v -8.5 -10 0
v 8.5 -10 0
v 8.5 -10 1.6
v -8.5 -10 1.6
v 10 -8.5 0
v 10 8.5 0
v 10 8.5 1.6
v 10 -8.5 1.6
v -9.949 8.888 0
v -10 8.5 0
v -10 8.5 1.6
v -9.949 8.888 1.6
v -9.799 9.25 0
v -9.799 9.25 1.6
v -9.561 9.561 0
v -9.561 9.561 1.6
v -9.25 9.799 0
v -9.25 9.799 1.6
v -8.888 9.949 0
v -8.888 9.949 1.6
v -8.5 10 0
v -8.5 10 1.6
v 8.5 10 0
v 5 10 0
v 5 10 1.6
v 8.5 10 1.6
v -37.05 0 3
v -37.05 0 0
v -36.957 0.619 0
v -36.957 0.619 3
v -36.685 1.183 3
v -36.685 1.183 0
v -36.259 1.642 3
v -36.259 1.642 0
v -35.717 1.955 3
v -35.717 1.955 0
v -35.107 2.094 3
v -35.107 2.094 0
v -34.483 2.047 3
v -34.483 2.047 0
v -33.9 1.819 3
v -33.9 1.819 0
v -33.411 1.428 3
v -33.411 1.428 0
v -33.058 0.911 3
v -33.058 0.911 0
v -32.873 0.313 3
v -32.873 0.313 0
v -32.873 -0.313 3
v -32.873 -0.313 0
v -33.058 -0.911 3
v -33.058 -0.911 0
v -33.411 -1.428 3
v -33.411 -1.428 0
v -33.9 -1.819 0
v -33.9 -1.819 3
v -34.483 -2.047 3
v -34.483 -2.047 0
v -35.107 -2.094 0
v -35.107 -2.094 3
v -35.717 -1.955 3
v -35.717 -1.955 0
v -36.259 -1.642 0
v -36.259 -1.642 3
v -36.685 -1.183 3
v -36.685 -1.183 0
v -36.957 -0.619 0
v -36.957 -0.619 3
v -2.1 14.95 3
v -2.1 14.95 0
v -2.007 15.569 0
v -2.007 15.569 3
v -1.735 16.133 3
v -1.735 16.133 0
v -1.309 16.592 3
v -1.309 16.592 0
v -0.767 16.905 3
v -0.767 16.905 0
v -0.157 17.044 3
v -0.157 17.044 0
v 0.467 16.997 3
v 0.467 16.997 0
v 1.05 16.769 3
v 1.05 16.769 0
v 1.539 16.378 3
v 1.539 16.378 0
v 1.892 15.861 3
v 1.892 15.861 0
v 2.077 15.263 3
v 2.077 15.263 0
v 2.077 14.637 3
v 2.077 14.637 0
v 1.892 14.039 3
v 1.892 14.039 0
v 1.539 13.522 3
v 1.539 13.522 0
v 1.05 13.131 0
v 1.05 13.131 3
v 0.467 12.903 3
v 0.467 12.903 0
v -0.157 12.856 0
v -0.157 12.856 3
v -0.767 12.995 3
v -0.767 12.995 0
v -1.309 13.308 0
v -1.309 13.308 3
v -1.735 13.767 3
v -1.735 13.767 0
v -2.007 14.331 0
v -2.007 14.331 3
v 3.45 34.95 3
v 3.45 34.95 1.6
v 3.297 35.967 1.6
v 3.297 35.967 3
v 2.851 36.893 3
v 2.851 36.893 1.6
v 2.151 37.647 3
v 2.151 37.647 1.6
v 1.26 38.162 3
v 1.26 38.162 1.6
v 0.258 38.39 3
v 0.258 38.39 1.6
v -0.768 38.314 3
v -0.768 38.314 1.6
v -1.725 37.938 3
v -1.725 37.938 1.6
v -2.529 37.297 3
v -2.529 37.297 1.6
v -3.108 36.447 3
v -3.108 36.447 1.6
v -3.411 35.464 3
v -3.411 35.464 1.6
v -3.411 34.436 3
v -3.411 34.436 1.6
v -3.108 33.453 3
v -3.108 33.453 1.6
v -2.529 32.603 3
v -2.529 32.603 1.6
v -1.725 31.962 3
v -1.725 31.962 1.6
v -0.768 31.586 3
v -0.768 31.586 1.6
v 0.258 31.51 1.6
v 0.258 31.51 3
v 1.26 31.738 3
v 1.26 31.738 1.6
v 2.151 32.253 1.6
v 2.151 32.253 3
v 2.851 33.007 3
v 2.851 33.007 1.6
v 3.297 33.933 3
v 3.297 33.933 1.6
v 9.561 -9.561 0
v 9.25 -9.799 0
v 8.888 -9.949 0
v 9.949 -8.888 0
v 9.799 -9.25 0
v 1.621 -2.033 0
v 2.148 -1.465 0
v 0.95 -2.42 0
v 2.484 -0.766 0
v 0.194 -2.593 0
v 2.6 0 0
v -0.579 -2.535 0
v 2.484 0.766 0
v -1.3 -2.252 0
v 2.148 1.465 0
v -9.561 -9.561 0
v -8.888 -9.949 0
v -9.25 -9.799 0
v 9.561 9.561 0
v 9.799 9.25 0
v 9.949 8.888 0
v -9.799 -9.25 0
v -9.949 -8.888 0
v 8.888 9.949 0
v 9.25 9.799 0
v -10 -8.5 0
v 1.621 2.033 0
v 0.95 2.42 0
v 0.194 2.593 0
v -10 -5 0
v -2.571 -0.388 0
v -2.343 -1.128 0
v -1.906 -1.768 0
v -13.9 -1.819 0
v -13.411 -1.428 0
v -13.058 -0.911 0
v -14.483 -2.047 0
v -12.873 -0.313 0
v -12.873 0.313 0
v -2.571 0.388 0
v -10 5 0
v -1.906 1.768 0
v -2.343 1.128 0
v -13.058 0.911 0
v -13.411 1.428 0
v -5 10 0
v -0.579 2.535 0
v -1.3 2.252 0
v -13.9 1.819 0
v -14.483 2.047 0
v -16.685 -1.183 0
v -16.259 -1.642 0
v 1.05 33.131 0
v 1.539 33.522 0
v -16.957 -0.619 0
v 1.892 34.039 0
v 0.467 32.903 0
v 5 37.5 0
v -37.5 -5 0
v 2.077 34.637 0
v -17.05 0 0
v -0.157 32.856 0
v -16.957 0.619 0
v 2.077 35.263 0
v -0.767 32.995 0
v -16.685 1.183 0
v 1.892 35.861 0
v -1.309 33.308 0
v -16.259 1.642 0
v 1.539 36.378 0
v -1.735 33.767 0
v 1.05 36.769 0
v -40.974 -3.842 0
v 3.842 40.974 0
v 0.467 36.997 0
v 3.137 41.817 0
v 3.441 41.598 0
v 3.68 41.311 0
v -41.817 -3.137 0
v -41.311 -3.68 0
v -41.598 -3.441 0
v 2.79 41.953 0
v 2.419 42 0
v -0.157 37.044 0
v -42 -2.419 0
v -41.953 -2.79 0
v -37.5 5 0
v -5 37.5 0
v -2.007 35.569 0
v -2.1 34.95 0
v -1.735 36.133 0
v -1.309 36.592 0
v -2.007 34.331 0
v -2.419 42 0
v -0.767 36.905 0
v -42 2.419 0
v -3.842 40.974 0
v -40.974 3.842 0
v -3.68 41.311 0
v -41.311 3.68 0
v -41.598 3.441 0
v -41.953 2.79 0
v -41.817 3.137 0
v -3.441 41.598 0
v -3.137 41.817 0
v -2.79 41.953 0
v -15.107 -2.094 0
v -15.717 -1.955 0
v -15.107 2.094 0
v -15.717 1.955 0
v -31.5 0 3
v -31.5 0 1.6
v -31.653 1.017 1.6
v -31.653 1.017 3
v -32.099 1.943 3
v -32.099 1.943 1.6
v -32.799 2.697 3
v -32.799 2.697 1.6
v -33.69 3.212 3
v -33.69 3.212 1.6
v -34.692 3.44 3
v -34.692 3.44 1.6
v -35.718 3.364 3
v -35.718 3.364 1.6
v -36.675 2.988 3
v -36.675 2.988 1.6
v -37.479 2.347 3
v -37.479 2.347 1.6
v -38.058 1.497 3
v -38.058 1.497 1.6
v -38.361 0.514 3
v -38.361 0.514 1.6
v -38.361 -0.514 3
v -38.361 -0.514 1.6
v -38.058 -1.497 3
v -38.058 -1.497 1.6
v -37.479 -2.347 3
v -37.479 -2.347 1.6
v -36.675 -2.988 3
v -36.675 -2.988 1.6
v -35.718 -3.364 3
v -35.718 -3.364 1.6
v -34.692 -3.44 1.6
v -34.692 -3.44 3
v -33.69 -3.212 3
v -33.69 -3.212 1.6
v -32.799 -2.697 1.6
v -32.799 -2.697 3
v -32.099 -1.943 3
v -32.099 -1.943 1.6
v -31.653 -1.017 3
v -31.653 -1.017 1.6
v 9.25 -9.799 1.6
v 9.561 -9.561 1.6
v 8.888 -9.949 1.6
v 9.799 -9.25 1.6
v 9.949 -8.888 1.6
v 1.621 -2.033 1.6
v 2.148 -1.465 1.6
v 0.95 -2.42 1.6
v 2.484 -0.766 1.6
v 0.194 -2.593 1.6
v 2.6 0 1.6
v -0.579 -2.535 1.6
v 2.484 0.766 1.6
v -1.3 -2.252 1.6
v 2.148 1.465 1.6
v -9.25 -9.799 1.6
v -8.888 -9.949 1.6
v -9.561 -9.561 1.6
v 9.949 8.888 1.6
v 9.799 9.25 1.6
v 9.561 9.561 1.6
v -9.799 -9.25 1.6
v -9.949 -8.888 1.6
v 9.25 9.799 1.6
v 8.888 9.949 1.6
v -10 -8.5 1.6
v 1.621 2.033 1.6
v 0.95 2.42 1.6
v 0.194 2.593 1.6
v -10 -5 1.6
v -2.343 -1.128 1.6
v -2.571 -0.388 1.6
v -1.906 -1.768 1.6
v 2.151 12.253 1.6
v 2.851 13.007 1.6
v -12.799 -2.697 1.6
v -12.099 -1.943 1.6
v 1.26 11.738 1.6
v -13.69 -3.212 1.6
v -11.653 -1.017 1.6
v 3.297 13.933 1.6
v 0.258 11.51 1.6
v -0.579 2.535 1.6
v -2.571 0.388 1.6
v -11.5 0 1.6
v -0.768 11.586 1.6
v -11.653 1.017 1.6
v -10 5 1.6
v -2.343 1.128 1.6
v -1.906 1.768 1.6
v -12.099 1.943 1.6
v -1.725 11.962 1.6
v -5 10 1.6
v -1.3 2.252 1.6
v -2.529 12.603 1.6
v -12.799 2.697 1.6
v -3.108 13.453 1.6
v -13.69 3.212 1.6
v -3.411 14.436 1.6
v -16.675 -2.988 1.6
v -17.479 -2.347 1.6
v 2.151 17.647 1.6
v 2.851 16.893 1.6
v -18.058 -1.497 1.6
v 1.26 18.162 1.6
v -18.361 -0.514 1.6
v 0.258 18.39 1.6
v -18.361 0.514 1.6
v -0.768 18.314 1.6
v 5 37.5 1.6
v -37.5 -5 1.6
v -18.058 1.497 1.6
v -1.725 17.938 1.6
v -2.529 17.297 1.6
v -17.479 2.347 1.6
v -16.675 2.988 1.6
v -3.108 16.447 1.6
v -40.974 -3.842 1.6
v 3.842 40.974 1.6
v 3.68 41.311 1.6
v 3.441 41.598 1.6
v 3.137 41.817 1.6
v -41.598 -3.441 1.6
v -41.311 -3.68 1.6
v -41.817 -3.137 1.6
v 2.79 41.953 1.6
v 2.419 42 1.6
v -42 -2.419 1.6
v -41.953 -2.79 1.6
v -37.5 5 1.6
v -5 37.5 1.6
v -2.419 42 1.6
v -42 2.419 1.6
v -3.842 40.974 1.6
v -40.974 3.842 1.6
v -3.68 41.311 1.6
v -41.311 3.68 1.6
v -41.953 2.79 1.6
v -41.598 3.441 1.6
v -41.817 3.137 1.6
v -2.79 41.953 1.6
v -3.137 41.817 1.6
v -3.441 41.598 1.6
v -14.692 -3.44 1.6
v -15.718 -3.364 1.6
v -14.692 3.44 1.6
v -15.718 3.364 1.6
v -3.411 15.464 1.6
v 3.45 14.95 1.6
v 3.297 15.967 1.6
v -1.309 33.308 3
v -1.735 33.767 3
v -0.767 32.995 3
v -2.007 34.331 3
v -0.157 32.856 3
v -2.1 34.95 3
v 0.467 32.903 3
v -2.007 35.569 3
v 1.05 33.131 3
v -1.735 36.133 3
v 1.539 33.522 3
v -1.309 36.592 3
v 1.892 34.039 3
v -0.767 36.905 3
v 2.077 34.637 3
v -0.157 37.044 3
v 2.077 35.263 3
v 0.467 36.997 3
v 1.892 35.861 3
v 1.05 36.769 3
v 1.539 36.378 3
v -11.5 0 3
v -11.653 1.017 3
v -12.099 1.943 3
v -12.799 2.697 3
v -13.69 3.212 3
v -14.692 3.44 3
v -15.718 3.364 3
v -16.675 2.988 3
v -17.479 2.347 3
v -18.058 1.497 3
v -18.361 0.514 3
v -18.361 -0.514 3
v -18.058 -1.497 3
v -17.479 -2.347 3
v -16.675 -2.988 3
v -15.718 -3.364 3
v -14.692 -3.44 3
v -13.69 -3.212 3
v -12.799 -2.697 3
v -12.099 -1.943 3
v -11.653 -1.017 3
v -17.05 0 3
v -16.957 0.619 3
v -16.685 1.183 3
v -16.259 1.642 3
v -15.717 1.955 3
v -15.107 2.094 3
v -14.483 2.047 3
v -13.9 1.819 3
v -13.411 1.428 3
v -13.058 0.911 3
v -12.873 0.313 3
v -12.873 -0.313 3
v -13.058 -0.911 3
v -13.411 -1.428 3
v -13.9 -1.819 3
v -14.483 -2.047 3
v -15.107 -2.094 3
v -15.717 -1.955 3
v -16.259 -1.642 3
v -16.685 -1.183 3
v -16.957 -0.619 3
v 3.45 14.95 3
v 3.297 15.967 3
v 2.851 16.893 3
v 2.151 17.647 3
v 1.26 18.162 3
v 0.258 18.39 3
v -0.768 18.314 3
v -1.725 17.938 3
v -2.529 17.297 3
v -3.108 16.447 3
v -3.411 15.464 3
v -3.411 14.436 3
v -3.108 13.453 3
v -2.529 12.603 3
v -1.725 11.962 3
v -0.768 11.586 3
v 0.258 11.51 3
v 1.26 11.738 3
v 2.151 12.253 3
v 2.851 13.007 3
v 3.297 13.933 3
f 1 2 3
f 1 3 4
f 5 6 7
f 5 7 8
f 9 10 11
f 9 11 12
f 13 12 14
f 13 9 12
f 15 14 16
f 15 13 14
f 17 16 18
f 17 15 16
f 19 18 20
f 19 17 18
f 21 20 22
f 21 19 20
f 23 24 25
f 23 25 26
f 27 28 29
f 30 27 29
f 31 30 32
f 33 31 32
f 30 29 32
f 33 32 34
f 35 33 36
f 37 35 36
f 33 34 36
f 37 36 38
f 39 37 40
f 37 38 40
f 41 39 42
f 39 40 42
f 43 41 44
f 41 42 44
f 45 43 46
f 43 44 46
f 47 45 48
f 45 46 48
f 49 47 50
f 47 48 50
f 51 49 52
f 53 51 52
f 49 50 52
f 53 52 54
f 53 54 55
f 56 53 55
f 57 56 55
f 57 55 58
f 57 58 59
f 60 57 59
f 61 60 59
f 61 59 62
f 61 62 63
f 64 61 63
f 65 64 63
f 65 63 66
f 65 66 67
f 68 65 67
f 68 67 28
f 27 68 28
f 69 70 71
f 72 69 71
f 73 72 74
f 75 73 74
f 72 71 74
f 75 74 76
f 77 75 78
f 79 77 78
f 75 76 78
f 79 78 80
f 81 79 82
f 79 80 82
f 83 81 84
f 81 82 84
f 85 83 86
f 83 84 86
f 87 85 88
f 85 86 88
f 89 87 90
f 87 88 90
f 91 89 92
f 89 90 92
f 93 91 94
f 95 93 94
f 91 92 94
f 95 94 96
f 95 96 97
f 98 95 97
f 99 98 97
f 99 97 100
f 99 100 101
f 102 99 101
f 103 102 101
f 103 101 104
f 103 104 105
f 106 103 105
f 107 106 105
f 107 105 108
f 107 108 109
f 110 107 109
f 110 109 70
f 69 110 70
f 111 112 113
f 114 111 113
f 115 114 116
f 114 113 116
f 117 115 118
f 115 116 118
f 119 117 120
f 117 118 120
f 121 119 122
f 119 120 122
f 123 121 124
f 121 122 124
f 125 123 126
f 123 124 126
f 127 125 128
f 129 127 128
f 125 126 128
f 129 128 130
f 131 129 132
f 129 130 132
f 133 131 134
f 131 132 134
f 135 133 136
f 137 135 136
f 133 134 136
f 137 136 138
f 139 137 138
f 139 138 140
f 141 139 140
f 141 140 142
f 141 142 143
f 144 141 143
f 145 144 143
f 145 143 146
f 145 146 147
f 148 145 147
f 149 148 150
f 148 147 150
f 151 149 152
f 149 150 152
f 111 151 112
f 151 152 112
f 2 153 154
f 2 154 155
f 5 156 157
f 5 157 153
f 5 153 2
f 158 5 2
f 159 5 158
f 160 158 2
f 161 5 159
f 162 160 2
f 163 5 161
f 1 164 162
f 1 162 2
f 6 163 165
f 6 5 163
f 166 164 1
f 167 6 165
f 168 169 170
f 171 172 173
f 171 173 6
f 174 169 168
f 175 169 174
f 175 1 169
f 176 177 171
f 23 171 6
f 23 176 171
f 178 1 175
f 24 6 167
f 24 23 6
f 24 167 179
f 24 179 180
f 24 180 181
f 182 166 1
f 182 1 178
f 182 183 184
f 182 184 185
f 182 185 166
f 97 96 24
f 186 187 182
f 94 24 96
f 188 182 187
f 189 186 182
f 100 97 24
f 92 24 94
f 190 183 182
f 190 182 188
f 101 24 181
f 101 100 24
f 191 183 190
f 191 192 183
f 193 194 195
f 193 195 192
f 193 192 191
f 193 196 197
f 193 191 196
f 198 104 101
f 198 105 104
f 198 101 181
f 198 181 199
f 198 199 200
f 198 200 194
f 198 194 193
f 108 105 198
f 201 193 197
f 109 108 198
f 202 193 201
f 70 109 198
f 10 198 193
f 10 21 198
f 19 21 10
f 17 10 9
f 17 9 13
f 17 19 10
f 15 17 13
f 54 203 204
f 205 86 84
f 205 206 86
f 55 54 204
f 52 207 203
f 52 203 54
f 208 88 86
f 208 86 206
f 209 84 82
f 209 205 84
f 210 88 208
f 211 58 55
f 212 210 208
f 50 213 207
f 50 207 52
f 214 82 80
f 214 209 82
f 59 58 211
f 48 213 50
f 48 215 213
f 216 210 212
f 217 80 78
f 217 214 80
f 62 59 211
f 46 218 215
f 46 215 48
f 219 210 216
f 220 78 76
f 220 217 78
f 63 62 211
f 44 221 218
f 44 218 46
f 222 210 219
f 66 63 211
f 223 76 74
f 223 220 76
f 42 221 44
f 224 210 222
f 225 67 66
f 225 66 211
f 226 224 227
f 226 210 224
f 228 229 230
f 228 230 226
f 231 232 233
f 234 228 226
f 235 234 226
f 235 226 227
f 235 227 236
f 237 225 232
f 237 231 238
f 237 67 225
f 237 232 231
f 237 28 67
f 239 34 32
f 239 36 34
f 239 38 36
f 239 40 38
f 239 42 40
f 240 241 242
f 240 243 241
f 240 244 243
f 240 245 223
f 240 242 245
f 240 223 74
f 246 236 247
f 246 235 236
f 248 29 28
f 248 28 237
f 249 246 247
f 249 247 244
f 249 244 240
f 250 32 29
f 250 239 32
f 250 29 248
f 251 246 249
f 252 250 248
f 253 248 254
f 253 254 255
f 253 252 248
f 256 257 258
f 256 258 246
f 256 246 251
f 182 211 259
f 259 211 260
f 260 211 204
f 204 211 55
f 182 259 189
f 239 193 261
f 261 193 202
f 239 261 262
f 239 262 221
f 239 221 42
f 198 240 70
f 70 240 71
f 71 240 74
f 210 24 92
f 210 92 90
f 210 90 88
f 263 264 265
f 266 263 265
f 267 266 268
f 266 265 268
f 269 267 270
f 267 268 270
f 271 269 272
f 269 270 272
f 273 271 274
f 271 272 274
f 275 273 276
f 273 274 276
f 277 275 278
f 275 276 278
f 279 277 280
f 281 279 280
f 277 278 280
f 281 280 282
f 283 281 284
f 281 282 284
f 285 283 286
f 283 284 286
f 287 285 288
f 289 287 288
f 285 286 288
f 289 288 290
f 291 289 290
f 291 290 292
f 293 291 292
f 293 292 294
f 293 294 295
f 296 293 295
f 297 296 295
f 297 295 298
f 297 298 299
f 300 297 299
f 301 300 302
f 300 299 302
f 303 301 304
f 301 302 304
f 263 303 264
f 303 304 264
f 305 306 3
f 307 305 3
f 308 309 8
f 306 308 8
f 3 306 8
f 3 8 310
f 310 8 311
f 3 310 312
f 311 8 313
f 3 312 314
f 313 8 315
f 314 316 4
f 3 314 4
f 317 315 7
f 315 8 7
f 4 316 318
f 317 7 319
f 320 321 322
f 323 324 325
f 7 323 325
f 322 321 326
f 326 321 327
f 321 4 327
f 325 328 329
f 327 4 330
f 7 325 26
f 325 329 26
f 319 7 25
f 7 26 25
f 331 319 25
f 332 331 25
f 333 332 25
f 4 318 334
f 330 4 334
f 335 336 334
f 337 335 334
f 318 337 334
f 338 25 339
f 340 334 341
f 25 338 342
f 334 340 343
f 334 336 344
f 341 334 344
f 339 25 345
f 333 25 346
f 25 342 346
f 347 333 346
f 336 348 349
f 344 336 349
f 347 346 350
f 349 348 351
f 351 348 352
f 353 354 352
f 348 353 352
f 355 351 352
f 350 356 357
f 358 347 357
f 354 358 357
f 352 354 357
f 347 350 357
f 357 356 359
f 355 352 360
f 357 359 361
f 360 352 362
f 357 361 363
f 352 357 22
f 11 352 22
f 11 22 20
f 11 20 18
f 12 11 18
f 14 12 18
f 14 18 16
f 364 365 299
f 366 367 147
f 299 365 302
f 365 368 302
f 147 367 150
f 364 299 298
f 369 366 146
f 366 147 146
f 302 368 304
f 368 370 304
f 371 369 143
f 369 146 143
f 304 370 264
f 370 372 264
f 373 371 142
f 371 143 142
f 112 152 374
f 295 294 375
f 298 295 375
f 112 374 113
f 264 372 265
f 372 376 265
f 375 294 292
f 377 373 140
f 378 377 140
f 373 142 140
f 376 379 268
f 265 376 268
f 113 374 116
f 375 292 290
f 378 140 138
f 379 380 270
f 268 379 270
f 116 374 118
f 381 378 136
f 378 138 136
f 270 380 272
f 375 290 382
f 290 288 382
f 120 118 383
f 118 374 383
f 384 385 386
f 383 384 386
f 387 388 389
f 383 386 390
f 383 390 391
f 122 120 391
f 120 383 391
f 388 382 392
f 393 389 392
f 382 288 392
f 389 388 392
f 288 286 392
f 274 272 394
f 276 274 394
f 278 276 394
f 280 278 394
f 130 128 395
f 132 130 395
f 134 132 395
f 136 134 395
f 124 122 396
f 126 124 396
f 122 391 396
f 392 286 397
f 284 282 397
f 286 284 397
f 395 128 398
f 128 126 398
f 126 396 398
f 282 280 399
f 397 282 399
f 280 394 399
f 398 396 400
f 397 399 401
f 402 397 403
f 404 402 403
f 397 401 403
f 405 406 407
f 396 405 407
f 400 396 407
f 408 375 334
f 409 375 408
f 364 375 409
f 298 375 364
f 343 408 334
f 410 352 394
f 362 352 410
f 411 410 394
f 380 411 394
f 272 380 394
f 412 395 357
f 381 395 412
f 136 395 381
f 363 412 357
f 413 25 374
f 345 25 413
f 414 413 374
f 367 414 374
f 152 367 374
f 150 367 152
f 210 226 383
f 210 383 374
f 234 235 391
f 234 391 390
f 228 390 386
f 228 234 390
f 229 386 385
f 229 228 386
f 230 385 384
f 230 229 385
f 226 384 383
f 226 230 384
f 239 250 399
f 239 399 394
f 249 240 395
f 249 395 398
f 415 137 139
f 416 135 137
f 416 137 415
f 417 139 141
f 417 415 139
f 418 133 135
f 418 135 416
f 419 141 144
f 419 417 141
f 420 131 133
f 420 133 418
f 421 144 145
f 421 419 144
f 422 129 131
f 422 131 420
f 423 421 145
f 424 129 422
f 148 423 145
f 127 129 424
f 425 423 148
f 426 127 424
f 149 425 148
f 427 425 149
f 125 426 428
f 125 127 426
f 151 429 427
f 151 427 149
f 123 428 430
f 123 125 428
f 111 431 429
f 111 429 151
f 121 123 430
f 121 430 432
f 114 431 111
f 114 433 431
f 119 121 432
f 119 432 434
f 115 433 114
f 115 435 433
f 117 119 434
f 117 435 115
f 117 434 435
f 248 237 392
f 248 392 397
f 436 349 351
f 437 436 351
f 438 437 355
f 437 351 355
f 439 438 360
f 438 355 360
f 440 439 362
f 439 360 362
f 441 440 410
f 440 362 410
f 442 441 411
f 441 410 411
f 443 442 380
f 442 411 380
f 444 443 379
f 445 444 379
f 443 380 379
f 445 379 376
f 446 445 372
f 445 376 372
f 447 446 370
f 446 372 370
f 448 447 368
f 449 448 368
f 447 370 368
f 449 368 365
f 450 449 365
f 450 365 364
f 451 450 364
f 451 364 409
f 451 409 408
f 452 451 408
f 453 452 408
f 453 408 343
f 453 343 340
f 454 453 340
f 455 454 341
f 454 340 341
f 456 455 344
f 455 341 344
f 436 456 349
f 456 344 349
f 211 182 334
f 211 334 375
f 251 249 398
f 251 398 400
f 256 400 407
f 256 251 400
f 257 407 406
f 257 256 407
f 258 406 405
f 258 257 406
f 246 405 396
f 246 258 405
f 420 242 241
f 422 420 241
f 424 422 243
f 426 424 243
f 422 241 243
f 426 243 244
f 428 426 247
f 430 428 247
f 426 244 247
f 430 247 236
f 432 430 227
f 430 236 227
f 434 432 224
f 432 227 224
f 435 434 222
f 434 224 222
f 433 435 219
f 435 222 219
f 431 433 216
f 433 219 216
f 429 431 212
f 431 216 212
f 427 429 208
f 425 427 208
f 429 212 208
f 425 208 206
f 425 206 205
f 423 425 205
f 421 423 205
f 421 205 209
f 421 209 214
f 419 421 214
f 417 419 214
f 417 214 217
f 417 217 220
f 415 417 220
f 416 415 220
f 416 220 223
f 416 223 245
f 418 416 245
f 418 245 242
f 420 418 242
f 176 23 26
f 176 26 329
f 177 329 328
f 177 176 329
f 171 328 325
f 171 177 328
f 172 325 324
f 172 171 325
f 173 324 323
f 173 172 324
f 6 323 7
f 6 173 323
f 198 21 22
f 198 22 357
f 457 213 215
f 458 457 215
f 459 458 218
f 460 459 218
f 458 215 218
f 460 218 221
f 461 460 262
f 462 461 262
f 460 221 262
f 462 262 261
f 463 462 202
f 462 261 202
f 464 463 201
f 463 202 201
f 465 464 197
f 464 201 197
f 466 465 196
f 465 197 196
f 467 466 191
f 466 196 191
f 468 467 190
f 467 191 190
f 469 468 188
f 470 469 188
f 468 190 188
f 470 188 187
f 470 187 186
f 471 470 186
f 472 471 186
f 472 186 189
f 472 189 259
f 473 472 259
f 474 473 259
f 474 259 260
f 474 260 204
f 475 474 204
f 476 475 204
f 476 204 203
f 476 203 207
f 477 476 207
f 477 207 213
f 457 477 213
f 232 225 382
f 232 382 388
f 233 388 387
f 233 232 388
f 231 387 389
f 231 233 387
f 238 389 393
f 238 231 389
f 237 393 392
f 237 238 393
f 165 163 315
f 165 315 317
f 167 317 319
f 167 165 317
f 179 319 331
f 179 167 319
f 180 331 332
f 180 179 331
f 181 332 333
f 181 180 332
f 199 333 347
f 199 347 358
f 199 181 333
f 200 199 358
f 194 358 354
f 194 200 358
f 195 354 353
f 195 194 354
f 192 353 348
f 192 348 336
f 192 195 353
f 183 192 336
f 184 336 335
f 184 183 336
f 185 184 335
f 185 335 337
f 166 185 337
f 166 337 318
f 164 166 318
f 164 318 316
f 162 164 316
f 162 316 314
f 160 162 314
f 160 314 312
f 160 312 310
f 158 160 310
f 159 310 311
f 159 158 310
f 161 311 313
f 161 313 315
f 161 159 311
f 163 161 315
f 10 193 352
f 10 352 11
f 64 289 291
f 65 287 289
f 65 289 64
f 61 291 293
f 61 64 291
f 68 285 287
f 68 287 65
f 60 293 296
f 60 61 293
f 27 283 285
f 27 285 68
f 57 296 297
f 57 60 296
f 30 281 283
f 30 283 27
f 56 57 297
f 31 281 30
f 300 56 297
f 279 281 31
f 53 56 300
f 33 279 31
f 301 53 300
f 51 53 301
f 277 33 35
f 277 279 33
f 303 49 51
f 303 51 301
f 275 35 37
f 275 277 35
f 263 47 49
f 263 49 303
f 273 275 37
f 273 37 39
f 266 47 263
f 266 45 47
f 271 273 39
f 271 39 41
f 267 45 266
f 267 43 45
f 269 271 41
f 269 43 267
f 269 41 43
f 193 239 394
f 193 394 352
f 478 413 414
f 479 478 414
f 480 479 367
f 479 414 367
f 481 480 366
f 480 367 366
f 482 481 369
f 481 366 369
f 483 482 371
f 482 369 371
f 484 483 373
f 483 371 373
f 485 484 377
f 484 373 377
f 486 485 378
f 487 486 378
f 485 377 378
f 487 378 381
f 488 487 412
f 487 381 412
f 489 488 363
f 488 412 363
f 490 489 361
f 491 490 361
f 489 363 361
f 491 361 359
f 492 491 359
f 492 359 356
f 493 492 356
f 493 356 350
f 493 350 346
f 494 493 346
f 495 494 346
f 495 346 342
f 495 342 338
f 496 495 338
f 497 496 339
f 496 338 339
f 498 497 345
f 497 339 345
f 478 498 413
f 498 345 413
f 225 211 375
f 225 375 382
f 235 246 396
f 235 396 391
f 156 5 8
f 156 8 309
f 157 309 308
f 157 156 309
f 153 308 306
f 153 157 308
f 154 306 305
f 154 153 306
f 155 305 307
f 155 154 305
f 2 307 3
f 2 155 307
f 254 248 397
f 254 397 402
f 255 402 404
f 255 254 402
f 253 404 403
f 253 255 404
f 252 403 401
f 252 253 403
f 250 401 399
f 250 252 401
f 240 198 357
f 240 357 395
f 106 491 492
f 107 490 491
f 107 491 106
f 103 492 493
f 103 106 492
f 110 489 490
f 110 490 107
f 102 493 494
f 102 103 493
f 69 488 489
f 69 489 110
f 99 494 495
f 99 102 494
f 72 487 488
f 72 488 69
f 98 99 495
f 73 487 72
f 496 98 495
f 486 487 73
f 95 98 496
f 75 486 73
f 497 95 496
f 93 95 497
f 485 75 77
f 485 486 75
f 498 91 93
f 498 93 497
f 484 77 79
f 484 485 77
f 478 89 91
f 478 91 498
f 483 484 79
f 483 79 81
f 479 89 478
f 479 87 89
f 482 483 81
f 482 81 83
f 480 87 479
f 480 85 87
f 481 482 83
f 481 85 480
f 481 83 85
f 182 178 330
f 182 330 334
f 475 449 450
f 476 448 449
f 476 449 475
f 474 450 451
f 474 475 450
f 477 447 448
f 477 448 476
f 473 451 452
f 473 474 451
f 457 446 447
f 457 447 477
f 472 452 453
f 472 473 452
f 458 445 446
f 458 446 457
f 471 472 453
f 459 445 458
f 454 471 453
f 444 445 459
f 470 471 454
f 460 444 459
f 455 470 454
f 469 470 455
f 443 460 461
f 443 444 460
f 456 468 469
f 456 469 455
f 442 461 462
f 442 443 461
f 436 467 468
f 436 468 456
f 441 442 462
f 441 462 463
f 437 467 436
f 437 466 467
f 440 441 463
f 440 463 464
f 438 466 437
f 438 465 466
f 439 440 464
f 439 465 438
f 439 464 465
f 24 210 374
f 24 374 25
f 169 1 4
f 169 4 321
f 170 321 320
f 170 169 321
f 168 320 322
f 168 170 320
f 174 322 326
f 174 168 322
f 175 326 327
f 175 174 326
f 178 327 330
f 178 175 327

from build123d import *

# Parameters (mm, degrees)
SKETCH1_R             = 2.6
BOSS_EXTRUDE1_DEPTH   = 1.6
SKETCH2_R             = 3.45
BOSS_EXTRUDE2_DEPTH   = 1.4
M5X0_8_TAPPED_HOLE1_D = 4.2


with BuildPart() as part:
    # Sketch1 → Boss-Extrude1 (new body)
    with BuildSketch(Plane.XY):
        with BuildLine():
            Line((-10, -8.5), (-10, -5))
            Line((-10, -5), (-37.5, -5))
            Line((-37.5, -5), (-40.974341649, -3.841886117))
            ThreePointArc((-40.974341649, -3.841886117), (-41.716863278, -3.295926597), (-42, -2.41886117))
            Line((-42, -2.41886117), (-42, 2.41886117))
            ThreePointArc((-42, 2.41886117), (-41.716863278, 3.295926597), (-40.974341649, 3.841886117))
            Line((-40.974341649, 3.841886117), (-37.5, 5))
            Line((-37.5, 5), (-10, 5))
            Line((-10, 5), (-10, 8.5))
            ThreePointArc((-10, 8.5), (-9.560660172, 9.560660172), (-8.5, 10))
            Line((-8.5, 10), (-5, 10))
            Line((-5, 10), (-5, 37.5))
            Line((-5, 37.5), (-3.841886117, 40.974341649))
            ThreePointArc((-3.841886117, 40.974341649), (-3.295926597, 41.716863278), (-2.41886117, 42))
            Line((-2.41886117, 42), (2.41886117, 42))
            ThreePointArc((2.41886117, 42), (3.295926597, 41.716863278), (3.841886117, 40.974341649))
            Line((3.841886117, 40.974341649), (5, 37.5))
            Line((5, 37.5), (5, 10))
            Line((5, 10), (8.5, 10))
            ThreePointArc((8.5, 10), (9.560660172, 9.560660172), (10, 8.5))
            Line((10, 8.5), (10, -8.5))
            ThreePointArc((10, -8.5), (9.560660172, -9.560660172), (8.5, -10))
            Line((8.5, -10), (5, -10))
            Line((5, -10), (-5, -10))
            Line((-5, -10), (-8.5, -10))
            ThreePointArc((-8.5, -10), (-9.560660172, -9.560660172), (-10, -8.5))
        make_face()
        Circle(SKETCH1_R, mode=Mode.SUBTRACT)
    extrude(amount=BOSS_EXTRUDE1_DEPTH)

    # Sketch2 → Boss-Extrude2 (add)
    with BuildSketch(Plane.XY.offset(1.6)):
        with Locations((0, 14.95)):
            Circle(SKETCH2_R)
        with Locations((0, 34.95)):
            Circle(SKETCH2_R)
        with Locations((-14.95, 0)):
            Circle(SKETCH2_R)
        with Locations((-34.95, 0)):
            Circle(SKETCH2_R)
    extrude(amount=BOSS_EXTRUDE2_DEPTH)

    # M5x0.8 Tapped Hole1 (through all)
    with Locations(Plane.XY.offset(3)):
        with Locations((0, 34.95), (0, 14.95), (-14.95, 0), (-34.95, 0)):
            Hole(M5X0_8_TAPPED_HOLE1_D / 2)


solid = part.part
